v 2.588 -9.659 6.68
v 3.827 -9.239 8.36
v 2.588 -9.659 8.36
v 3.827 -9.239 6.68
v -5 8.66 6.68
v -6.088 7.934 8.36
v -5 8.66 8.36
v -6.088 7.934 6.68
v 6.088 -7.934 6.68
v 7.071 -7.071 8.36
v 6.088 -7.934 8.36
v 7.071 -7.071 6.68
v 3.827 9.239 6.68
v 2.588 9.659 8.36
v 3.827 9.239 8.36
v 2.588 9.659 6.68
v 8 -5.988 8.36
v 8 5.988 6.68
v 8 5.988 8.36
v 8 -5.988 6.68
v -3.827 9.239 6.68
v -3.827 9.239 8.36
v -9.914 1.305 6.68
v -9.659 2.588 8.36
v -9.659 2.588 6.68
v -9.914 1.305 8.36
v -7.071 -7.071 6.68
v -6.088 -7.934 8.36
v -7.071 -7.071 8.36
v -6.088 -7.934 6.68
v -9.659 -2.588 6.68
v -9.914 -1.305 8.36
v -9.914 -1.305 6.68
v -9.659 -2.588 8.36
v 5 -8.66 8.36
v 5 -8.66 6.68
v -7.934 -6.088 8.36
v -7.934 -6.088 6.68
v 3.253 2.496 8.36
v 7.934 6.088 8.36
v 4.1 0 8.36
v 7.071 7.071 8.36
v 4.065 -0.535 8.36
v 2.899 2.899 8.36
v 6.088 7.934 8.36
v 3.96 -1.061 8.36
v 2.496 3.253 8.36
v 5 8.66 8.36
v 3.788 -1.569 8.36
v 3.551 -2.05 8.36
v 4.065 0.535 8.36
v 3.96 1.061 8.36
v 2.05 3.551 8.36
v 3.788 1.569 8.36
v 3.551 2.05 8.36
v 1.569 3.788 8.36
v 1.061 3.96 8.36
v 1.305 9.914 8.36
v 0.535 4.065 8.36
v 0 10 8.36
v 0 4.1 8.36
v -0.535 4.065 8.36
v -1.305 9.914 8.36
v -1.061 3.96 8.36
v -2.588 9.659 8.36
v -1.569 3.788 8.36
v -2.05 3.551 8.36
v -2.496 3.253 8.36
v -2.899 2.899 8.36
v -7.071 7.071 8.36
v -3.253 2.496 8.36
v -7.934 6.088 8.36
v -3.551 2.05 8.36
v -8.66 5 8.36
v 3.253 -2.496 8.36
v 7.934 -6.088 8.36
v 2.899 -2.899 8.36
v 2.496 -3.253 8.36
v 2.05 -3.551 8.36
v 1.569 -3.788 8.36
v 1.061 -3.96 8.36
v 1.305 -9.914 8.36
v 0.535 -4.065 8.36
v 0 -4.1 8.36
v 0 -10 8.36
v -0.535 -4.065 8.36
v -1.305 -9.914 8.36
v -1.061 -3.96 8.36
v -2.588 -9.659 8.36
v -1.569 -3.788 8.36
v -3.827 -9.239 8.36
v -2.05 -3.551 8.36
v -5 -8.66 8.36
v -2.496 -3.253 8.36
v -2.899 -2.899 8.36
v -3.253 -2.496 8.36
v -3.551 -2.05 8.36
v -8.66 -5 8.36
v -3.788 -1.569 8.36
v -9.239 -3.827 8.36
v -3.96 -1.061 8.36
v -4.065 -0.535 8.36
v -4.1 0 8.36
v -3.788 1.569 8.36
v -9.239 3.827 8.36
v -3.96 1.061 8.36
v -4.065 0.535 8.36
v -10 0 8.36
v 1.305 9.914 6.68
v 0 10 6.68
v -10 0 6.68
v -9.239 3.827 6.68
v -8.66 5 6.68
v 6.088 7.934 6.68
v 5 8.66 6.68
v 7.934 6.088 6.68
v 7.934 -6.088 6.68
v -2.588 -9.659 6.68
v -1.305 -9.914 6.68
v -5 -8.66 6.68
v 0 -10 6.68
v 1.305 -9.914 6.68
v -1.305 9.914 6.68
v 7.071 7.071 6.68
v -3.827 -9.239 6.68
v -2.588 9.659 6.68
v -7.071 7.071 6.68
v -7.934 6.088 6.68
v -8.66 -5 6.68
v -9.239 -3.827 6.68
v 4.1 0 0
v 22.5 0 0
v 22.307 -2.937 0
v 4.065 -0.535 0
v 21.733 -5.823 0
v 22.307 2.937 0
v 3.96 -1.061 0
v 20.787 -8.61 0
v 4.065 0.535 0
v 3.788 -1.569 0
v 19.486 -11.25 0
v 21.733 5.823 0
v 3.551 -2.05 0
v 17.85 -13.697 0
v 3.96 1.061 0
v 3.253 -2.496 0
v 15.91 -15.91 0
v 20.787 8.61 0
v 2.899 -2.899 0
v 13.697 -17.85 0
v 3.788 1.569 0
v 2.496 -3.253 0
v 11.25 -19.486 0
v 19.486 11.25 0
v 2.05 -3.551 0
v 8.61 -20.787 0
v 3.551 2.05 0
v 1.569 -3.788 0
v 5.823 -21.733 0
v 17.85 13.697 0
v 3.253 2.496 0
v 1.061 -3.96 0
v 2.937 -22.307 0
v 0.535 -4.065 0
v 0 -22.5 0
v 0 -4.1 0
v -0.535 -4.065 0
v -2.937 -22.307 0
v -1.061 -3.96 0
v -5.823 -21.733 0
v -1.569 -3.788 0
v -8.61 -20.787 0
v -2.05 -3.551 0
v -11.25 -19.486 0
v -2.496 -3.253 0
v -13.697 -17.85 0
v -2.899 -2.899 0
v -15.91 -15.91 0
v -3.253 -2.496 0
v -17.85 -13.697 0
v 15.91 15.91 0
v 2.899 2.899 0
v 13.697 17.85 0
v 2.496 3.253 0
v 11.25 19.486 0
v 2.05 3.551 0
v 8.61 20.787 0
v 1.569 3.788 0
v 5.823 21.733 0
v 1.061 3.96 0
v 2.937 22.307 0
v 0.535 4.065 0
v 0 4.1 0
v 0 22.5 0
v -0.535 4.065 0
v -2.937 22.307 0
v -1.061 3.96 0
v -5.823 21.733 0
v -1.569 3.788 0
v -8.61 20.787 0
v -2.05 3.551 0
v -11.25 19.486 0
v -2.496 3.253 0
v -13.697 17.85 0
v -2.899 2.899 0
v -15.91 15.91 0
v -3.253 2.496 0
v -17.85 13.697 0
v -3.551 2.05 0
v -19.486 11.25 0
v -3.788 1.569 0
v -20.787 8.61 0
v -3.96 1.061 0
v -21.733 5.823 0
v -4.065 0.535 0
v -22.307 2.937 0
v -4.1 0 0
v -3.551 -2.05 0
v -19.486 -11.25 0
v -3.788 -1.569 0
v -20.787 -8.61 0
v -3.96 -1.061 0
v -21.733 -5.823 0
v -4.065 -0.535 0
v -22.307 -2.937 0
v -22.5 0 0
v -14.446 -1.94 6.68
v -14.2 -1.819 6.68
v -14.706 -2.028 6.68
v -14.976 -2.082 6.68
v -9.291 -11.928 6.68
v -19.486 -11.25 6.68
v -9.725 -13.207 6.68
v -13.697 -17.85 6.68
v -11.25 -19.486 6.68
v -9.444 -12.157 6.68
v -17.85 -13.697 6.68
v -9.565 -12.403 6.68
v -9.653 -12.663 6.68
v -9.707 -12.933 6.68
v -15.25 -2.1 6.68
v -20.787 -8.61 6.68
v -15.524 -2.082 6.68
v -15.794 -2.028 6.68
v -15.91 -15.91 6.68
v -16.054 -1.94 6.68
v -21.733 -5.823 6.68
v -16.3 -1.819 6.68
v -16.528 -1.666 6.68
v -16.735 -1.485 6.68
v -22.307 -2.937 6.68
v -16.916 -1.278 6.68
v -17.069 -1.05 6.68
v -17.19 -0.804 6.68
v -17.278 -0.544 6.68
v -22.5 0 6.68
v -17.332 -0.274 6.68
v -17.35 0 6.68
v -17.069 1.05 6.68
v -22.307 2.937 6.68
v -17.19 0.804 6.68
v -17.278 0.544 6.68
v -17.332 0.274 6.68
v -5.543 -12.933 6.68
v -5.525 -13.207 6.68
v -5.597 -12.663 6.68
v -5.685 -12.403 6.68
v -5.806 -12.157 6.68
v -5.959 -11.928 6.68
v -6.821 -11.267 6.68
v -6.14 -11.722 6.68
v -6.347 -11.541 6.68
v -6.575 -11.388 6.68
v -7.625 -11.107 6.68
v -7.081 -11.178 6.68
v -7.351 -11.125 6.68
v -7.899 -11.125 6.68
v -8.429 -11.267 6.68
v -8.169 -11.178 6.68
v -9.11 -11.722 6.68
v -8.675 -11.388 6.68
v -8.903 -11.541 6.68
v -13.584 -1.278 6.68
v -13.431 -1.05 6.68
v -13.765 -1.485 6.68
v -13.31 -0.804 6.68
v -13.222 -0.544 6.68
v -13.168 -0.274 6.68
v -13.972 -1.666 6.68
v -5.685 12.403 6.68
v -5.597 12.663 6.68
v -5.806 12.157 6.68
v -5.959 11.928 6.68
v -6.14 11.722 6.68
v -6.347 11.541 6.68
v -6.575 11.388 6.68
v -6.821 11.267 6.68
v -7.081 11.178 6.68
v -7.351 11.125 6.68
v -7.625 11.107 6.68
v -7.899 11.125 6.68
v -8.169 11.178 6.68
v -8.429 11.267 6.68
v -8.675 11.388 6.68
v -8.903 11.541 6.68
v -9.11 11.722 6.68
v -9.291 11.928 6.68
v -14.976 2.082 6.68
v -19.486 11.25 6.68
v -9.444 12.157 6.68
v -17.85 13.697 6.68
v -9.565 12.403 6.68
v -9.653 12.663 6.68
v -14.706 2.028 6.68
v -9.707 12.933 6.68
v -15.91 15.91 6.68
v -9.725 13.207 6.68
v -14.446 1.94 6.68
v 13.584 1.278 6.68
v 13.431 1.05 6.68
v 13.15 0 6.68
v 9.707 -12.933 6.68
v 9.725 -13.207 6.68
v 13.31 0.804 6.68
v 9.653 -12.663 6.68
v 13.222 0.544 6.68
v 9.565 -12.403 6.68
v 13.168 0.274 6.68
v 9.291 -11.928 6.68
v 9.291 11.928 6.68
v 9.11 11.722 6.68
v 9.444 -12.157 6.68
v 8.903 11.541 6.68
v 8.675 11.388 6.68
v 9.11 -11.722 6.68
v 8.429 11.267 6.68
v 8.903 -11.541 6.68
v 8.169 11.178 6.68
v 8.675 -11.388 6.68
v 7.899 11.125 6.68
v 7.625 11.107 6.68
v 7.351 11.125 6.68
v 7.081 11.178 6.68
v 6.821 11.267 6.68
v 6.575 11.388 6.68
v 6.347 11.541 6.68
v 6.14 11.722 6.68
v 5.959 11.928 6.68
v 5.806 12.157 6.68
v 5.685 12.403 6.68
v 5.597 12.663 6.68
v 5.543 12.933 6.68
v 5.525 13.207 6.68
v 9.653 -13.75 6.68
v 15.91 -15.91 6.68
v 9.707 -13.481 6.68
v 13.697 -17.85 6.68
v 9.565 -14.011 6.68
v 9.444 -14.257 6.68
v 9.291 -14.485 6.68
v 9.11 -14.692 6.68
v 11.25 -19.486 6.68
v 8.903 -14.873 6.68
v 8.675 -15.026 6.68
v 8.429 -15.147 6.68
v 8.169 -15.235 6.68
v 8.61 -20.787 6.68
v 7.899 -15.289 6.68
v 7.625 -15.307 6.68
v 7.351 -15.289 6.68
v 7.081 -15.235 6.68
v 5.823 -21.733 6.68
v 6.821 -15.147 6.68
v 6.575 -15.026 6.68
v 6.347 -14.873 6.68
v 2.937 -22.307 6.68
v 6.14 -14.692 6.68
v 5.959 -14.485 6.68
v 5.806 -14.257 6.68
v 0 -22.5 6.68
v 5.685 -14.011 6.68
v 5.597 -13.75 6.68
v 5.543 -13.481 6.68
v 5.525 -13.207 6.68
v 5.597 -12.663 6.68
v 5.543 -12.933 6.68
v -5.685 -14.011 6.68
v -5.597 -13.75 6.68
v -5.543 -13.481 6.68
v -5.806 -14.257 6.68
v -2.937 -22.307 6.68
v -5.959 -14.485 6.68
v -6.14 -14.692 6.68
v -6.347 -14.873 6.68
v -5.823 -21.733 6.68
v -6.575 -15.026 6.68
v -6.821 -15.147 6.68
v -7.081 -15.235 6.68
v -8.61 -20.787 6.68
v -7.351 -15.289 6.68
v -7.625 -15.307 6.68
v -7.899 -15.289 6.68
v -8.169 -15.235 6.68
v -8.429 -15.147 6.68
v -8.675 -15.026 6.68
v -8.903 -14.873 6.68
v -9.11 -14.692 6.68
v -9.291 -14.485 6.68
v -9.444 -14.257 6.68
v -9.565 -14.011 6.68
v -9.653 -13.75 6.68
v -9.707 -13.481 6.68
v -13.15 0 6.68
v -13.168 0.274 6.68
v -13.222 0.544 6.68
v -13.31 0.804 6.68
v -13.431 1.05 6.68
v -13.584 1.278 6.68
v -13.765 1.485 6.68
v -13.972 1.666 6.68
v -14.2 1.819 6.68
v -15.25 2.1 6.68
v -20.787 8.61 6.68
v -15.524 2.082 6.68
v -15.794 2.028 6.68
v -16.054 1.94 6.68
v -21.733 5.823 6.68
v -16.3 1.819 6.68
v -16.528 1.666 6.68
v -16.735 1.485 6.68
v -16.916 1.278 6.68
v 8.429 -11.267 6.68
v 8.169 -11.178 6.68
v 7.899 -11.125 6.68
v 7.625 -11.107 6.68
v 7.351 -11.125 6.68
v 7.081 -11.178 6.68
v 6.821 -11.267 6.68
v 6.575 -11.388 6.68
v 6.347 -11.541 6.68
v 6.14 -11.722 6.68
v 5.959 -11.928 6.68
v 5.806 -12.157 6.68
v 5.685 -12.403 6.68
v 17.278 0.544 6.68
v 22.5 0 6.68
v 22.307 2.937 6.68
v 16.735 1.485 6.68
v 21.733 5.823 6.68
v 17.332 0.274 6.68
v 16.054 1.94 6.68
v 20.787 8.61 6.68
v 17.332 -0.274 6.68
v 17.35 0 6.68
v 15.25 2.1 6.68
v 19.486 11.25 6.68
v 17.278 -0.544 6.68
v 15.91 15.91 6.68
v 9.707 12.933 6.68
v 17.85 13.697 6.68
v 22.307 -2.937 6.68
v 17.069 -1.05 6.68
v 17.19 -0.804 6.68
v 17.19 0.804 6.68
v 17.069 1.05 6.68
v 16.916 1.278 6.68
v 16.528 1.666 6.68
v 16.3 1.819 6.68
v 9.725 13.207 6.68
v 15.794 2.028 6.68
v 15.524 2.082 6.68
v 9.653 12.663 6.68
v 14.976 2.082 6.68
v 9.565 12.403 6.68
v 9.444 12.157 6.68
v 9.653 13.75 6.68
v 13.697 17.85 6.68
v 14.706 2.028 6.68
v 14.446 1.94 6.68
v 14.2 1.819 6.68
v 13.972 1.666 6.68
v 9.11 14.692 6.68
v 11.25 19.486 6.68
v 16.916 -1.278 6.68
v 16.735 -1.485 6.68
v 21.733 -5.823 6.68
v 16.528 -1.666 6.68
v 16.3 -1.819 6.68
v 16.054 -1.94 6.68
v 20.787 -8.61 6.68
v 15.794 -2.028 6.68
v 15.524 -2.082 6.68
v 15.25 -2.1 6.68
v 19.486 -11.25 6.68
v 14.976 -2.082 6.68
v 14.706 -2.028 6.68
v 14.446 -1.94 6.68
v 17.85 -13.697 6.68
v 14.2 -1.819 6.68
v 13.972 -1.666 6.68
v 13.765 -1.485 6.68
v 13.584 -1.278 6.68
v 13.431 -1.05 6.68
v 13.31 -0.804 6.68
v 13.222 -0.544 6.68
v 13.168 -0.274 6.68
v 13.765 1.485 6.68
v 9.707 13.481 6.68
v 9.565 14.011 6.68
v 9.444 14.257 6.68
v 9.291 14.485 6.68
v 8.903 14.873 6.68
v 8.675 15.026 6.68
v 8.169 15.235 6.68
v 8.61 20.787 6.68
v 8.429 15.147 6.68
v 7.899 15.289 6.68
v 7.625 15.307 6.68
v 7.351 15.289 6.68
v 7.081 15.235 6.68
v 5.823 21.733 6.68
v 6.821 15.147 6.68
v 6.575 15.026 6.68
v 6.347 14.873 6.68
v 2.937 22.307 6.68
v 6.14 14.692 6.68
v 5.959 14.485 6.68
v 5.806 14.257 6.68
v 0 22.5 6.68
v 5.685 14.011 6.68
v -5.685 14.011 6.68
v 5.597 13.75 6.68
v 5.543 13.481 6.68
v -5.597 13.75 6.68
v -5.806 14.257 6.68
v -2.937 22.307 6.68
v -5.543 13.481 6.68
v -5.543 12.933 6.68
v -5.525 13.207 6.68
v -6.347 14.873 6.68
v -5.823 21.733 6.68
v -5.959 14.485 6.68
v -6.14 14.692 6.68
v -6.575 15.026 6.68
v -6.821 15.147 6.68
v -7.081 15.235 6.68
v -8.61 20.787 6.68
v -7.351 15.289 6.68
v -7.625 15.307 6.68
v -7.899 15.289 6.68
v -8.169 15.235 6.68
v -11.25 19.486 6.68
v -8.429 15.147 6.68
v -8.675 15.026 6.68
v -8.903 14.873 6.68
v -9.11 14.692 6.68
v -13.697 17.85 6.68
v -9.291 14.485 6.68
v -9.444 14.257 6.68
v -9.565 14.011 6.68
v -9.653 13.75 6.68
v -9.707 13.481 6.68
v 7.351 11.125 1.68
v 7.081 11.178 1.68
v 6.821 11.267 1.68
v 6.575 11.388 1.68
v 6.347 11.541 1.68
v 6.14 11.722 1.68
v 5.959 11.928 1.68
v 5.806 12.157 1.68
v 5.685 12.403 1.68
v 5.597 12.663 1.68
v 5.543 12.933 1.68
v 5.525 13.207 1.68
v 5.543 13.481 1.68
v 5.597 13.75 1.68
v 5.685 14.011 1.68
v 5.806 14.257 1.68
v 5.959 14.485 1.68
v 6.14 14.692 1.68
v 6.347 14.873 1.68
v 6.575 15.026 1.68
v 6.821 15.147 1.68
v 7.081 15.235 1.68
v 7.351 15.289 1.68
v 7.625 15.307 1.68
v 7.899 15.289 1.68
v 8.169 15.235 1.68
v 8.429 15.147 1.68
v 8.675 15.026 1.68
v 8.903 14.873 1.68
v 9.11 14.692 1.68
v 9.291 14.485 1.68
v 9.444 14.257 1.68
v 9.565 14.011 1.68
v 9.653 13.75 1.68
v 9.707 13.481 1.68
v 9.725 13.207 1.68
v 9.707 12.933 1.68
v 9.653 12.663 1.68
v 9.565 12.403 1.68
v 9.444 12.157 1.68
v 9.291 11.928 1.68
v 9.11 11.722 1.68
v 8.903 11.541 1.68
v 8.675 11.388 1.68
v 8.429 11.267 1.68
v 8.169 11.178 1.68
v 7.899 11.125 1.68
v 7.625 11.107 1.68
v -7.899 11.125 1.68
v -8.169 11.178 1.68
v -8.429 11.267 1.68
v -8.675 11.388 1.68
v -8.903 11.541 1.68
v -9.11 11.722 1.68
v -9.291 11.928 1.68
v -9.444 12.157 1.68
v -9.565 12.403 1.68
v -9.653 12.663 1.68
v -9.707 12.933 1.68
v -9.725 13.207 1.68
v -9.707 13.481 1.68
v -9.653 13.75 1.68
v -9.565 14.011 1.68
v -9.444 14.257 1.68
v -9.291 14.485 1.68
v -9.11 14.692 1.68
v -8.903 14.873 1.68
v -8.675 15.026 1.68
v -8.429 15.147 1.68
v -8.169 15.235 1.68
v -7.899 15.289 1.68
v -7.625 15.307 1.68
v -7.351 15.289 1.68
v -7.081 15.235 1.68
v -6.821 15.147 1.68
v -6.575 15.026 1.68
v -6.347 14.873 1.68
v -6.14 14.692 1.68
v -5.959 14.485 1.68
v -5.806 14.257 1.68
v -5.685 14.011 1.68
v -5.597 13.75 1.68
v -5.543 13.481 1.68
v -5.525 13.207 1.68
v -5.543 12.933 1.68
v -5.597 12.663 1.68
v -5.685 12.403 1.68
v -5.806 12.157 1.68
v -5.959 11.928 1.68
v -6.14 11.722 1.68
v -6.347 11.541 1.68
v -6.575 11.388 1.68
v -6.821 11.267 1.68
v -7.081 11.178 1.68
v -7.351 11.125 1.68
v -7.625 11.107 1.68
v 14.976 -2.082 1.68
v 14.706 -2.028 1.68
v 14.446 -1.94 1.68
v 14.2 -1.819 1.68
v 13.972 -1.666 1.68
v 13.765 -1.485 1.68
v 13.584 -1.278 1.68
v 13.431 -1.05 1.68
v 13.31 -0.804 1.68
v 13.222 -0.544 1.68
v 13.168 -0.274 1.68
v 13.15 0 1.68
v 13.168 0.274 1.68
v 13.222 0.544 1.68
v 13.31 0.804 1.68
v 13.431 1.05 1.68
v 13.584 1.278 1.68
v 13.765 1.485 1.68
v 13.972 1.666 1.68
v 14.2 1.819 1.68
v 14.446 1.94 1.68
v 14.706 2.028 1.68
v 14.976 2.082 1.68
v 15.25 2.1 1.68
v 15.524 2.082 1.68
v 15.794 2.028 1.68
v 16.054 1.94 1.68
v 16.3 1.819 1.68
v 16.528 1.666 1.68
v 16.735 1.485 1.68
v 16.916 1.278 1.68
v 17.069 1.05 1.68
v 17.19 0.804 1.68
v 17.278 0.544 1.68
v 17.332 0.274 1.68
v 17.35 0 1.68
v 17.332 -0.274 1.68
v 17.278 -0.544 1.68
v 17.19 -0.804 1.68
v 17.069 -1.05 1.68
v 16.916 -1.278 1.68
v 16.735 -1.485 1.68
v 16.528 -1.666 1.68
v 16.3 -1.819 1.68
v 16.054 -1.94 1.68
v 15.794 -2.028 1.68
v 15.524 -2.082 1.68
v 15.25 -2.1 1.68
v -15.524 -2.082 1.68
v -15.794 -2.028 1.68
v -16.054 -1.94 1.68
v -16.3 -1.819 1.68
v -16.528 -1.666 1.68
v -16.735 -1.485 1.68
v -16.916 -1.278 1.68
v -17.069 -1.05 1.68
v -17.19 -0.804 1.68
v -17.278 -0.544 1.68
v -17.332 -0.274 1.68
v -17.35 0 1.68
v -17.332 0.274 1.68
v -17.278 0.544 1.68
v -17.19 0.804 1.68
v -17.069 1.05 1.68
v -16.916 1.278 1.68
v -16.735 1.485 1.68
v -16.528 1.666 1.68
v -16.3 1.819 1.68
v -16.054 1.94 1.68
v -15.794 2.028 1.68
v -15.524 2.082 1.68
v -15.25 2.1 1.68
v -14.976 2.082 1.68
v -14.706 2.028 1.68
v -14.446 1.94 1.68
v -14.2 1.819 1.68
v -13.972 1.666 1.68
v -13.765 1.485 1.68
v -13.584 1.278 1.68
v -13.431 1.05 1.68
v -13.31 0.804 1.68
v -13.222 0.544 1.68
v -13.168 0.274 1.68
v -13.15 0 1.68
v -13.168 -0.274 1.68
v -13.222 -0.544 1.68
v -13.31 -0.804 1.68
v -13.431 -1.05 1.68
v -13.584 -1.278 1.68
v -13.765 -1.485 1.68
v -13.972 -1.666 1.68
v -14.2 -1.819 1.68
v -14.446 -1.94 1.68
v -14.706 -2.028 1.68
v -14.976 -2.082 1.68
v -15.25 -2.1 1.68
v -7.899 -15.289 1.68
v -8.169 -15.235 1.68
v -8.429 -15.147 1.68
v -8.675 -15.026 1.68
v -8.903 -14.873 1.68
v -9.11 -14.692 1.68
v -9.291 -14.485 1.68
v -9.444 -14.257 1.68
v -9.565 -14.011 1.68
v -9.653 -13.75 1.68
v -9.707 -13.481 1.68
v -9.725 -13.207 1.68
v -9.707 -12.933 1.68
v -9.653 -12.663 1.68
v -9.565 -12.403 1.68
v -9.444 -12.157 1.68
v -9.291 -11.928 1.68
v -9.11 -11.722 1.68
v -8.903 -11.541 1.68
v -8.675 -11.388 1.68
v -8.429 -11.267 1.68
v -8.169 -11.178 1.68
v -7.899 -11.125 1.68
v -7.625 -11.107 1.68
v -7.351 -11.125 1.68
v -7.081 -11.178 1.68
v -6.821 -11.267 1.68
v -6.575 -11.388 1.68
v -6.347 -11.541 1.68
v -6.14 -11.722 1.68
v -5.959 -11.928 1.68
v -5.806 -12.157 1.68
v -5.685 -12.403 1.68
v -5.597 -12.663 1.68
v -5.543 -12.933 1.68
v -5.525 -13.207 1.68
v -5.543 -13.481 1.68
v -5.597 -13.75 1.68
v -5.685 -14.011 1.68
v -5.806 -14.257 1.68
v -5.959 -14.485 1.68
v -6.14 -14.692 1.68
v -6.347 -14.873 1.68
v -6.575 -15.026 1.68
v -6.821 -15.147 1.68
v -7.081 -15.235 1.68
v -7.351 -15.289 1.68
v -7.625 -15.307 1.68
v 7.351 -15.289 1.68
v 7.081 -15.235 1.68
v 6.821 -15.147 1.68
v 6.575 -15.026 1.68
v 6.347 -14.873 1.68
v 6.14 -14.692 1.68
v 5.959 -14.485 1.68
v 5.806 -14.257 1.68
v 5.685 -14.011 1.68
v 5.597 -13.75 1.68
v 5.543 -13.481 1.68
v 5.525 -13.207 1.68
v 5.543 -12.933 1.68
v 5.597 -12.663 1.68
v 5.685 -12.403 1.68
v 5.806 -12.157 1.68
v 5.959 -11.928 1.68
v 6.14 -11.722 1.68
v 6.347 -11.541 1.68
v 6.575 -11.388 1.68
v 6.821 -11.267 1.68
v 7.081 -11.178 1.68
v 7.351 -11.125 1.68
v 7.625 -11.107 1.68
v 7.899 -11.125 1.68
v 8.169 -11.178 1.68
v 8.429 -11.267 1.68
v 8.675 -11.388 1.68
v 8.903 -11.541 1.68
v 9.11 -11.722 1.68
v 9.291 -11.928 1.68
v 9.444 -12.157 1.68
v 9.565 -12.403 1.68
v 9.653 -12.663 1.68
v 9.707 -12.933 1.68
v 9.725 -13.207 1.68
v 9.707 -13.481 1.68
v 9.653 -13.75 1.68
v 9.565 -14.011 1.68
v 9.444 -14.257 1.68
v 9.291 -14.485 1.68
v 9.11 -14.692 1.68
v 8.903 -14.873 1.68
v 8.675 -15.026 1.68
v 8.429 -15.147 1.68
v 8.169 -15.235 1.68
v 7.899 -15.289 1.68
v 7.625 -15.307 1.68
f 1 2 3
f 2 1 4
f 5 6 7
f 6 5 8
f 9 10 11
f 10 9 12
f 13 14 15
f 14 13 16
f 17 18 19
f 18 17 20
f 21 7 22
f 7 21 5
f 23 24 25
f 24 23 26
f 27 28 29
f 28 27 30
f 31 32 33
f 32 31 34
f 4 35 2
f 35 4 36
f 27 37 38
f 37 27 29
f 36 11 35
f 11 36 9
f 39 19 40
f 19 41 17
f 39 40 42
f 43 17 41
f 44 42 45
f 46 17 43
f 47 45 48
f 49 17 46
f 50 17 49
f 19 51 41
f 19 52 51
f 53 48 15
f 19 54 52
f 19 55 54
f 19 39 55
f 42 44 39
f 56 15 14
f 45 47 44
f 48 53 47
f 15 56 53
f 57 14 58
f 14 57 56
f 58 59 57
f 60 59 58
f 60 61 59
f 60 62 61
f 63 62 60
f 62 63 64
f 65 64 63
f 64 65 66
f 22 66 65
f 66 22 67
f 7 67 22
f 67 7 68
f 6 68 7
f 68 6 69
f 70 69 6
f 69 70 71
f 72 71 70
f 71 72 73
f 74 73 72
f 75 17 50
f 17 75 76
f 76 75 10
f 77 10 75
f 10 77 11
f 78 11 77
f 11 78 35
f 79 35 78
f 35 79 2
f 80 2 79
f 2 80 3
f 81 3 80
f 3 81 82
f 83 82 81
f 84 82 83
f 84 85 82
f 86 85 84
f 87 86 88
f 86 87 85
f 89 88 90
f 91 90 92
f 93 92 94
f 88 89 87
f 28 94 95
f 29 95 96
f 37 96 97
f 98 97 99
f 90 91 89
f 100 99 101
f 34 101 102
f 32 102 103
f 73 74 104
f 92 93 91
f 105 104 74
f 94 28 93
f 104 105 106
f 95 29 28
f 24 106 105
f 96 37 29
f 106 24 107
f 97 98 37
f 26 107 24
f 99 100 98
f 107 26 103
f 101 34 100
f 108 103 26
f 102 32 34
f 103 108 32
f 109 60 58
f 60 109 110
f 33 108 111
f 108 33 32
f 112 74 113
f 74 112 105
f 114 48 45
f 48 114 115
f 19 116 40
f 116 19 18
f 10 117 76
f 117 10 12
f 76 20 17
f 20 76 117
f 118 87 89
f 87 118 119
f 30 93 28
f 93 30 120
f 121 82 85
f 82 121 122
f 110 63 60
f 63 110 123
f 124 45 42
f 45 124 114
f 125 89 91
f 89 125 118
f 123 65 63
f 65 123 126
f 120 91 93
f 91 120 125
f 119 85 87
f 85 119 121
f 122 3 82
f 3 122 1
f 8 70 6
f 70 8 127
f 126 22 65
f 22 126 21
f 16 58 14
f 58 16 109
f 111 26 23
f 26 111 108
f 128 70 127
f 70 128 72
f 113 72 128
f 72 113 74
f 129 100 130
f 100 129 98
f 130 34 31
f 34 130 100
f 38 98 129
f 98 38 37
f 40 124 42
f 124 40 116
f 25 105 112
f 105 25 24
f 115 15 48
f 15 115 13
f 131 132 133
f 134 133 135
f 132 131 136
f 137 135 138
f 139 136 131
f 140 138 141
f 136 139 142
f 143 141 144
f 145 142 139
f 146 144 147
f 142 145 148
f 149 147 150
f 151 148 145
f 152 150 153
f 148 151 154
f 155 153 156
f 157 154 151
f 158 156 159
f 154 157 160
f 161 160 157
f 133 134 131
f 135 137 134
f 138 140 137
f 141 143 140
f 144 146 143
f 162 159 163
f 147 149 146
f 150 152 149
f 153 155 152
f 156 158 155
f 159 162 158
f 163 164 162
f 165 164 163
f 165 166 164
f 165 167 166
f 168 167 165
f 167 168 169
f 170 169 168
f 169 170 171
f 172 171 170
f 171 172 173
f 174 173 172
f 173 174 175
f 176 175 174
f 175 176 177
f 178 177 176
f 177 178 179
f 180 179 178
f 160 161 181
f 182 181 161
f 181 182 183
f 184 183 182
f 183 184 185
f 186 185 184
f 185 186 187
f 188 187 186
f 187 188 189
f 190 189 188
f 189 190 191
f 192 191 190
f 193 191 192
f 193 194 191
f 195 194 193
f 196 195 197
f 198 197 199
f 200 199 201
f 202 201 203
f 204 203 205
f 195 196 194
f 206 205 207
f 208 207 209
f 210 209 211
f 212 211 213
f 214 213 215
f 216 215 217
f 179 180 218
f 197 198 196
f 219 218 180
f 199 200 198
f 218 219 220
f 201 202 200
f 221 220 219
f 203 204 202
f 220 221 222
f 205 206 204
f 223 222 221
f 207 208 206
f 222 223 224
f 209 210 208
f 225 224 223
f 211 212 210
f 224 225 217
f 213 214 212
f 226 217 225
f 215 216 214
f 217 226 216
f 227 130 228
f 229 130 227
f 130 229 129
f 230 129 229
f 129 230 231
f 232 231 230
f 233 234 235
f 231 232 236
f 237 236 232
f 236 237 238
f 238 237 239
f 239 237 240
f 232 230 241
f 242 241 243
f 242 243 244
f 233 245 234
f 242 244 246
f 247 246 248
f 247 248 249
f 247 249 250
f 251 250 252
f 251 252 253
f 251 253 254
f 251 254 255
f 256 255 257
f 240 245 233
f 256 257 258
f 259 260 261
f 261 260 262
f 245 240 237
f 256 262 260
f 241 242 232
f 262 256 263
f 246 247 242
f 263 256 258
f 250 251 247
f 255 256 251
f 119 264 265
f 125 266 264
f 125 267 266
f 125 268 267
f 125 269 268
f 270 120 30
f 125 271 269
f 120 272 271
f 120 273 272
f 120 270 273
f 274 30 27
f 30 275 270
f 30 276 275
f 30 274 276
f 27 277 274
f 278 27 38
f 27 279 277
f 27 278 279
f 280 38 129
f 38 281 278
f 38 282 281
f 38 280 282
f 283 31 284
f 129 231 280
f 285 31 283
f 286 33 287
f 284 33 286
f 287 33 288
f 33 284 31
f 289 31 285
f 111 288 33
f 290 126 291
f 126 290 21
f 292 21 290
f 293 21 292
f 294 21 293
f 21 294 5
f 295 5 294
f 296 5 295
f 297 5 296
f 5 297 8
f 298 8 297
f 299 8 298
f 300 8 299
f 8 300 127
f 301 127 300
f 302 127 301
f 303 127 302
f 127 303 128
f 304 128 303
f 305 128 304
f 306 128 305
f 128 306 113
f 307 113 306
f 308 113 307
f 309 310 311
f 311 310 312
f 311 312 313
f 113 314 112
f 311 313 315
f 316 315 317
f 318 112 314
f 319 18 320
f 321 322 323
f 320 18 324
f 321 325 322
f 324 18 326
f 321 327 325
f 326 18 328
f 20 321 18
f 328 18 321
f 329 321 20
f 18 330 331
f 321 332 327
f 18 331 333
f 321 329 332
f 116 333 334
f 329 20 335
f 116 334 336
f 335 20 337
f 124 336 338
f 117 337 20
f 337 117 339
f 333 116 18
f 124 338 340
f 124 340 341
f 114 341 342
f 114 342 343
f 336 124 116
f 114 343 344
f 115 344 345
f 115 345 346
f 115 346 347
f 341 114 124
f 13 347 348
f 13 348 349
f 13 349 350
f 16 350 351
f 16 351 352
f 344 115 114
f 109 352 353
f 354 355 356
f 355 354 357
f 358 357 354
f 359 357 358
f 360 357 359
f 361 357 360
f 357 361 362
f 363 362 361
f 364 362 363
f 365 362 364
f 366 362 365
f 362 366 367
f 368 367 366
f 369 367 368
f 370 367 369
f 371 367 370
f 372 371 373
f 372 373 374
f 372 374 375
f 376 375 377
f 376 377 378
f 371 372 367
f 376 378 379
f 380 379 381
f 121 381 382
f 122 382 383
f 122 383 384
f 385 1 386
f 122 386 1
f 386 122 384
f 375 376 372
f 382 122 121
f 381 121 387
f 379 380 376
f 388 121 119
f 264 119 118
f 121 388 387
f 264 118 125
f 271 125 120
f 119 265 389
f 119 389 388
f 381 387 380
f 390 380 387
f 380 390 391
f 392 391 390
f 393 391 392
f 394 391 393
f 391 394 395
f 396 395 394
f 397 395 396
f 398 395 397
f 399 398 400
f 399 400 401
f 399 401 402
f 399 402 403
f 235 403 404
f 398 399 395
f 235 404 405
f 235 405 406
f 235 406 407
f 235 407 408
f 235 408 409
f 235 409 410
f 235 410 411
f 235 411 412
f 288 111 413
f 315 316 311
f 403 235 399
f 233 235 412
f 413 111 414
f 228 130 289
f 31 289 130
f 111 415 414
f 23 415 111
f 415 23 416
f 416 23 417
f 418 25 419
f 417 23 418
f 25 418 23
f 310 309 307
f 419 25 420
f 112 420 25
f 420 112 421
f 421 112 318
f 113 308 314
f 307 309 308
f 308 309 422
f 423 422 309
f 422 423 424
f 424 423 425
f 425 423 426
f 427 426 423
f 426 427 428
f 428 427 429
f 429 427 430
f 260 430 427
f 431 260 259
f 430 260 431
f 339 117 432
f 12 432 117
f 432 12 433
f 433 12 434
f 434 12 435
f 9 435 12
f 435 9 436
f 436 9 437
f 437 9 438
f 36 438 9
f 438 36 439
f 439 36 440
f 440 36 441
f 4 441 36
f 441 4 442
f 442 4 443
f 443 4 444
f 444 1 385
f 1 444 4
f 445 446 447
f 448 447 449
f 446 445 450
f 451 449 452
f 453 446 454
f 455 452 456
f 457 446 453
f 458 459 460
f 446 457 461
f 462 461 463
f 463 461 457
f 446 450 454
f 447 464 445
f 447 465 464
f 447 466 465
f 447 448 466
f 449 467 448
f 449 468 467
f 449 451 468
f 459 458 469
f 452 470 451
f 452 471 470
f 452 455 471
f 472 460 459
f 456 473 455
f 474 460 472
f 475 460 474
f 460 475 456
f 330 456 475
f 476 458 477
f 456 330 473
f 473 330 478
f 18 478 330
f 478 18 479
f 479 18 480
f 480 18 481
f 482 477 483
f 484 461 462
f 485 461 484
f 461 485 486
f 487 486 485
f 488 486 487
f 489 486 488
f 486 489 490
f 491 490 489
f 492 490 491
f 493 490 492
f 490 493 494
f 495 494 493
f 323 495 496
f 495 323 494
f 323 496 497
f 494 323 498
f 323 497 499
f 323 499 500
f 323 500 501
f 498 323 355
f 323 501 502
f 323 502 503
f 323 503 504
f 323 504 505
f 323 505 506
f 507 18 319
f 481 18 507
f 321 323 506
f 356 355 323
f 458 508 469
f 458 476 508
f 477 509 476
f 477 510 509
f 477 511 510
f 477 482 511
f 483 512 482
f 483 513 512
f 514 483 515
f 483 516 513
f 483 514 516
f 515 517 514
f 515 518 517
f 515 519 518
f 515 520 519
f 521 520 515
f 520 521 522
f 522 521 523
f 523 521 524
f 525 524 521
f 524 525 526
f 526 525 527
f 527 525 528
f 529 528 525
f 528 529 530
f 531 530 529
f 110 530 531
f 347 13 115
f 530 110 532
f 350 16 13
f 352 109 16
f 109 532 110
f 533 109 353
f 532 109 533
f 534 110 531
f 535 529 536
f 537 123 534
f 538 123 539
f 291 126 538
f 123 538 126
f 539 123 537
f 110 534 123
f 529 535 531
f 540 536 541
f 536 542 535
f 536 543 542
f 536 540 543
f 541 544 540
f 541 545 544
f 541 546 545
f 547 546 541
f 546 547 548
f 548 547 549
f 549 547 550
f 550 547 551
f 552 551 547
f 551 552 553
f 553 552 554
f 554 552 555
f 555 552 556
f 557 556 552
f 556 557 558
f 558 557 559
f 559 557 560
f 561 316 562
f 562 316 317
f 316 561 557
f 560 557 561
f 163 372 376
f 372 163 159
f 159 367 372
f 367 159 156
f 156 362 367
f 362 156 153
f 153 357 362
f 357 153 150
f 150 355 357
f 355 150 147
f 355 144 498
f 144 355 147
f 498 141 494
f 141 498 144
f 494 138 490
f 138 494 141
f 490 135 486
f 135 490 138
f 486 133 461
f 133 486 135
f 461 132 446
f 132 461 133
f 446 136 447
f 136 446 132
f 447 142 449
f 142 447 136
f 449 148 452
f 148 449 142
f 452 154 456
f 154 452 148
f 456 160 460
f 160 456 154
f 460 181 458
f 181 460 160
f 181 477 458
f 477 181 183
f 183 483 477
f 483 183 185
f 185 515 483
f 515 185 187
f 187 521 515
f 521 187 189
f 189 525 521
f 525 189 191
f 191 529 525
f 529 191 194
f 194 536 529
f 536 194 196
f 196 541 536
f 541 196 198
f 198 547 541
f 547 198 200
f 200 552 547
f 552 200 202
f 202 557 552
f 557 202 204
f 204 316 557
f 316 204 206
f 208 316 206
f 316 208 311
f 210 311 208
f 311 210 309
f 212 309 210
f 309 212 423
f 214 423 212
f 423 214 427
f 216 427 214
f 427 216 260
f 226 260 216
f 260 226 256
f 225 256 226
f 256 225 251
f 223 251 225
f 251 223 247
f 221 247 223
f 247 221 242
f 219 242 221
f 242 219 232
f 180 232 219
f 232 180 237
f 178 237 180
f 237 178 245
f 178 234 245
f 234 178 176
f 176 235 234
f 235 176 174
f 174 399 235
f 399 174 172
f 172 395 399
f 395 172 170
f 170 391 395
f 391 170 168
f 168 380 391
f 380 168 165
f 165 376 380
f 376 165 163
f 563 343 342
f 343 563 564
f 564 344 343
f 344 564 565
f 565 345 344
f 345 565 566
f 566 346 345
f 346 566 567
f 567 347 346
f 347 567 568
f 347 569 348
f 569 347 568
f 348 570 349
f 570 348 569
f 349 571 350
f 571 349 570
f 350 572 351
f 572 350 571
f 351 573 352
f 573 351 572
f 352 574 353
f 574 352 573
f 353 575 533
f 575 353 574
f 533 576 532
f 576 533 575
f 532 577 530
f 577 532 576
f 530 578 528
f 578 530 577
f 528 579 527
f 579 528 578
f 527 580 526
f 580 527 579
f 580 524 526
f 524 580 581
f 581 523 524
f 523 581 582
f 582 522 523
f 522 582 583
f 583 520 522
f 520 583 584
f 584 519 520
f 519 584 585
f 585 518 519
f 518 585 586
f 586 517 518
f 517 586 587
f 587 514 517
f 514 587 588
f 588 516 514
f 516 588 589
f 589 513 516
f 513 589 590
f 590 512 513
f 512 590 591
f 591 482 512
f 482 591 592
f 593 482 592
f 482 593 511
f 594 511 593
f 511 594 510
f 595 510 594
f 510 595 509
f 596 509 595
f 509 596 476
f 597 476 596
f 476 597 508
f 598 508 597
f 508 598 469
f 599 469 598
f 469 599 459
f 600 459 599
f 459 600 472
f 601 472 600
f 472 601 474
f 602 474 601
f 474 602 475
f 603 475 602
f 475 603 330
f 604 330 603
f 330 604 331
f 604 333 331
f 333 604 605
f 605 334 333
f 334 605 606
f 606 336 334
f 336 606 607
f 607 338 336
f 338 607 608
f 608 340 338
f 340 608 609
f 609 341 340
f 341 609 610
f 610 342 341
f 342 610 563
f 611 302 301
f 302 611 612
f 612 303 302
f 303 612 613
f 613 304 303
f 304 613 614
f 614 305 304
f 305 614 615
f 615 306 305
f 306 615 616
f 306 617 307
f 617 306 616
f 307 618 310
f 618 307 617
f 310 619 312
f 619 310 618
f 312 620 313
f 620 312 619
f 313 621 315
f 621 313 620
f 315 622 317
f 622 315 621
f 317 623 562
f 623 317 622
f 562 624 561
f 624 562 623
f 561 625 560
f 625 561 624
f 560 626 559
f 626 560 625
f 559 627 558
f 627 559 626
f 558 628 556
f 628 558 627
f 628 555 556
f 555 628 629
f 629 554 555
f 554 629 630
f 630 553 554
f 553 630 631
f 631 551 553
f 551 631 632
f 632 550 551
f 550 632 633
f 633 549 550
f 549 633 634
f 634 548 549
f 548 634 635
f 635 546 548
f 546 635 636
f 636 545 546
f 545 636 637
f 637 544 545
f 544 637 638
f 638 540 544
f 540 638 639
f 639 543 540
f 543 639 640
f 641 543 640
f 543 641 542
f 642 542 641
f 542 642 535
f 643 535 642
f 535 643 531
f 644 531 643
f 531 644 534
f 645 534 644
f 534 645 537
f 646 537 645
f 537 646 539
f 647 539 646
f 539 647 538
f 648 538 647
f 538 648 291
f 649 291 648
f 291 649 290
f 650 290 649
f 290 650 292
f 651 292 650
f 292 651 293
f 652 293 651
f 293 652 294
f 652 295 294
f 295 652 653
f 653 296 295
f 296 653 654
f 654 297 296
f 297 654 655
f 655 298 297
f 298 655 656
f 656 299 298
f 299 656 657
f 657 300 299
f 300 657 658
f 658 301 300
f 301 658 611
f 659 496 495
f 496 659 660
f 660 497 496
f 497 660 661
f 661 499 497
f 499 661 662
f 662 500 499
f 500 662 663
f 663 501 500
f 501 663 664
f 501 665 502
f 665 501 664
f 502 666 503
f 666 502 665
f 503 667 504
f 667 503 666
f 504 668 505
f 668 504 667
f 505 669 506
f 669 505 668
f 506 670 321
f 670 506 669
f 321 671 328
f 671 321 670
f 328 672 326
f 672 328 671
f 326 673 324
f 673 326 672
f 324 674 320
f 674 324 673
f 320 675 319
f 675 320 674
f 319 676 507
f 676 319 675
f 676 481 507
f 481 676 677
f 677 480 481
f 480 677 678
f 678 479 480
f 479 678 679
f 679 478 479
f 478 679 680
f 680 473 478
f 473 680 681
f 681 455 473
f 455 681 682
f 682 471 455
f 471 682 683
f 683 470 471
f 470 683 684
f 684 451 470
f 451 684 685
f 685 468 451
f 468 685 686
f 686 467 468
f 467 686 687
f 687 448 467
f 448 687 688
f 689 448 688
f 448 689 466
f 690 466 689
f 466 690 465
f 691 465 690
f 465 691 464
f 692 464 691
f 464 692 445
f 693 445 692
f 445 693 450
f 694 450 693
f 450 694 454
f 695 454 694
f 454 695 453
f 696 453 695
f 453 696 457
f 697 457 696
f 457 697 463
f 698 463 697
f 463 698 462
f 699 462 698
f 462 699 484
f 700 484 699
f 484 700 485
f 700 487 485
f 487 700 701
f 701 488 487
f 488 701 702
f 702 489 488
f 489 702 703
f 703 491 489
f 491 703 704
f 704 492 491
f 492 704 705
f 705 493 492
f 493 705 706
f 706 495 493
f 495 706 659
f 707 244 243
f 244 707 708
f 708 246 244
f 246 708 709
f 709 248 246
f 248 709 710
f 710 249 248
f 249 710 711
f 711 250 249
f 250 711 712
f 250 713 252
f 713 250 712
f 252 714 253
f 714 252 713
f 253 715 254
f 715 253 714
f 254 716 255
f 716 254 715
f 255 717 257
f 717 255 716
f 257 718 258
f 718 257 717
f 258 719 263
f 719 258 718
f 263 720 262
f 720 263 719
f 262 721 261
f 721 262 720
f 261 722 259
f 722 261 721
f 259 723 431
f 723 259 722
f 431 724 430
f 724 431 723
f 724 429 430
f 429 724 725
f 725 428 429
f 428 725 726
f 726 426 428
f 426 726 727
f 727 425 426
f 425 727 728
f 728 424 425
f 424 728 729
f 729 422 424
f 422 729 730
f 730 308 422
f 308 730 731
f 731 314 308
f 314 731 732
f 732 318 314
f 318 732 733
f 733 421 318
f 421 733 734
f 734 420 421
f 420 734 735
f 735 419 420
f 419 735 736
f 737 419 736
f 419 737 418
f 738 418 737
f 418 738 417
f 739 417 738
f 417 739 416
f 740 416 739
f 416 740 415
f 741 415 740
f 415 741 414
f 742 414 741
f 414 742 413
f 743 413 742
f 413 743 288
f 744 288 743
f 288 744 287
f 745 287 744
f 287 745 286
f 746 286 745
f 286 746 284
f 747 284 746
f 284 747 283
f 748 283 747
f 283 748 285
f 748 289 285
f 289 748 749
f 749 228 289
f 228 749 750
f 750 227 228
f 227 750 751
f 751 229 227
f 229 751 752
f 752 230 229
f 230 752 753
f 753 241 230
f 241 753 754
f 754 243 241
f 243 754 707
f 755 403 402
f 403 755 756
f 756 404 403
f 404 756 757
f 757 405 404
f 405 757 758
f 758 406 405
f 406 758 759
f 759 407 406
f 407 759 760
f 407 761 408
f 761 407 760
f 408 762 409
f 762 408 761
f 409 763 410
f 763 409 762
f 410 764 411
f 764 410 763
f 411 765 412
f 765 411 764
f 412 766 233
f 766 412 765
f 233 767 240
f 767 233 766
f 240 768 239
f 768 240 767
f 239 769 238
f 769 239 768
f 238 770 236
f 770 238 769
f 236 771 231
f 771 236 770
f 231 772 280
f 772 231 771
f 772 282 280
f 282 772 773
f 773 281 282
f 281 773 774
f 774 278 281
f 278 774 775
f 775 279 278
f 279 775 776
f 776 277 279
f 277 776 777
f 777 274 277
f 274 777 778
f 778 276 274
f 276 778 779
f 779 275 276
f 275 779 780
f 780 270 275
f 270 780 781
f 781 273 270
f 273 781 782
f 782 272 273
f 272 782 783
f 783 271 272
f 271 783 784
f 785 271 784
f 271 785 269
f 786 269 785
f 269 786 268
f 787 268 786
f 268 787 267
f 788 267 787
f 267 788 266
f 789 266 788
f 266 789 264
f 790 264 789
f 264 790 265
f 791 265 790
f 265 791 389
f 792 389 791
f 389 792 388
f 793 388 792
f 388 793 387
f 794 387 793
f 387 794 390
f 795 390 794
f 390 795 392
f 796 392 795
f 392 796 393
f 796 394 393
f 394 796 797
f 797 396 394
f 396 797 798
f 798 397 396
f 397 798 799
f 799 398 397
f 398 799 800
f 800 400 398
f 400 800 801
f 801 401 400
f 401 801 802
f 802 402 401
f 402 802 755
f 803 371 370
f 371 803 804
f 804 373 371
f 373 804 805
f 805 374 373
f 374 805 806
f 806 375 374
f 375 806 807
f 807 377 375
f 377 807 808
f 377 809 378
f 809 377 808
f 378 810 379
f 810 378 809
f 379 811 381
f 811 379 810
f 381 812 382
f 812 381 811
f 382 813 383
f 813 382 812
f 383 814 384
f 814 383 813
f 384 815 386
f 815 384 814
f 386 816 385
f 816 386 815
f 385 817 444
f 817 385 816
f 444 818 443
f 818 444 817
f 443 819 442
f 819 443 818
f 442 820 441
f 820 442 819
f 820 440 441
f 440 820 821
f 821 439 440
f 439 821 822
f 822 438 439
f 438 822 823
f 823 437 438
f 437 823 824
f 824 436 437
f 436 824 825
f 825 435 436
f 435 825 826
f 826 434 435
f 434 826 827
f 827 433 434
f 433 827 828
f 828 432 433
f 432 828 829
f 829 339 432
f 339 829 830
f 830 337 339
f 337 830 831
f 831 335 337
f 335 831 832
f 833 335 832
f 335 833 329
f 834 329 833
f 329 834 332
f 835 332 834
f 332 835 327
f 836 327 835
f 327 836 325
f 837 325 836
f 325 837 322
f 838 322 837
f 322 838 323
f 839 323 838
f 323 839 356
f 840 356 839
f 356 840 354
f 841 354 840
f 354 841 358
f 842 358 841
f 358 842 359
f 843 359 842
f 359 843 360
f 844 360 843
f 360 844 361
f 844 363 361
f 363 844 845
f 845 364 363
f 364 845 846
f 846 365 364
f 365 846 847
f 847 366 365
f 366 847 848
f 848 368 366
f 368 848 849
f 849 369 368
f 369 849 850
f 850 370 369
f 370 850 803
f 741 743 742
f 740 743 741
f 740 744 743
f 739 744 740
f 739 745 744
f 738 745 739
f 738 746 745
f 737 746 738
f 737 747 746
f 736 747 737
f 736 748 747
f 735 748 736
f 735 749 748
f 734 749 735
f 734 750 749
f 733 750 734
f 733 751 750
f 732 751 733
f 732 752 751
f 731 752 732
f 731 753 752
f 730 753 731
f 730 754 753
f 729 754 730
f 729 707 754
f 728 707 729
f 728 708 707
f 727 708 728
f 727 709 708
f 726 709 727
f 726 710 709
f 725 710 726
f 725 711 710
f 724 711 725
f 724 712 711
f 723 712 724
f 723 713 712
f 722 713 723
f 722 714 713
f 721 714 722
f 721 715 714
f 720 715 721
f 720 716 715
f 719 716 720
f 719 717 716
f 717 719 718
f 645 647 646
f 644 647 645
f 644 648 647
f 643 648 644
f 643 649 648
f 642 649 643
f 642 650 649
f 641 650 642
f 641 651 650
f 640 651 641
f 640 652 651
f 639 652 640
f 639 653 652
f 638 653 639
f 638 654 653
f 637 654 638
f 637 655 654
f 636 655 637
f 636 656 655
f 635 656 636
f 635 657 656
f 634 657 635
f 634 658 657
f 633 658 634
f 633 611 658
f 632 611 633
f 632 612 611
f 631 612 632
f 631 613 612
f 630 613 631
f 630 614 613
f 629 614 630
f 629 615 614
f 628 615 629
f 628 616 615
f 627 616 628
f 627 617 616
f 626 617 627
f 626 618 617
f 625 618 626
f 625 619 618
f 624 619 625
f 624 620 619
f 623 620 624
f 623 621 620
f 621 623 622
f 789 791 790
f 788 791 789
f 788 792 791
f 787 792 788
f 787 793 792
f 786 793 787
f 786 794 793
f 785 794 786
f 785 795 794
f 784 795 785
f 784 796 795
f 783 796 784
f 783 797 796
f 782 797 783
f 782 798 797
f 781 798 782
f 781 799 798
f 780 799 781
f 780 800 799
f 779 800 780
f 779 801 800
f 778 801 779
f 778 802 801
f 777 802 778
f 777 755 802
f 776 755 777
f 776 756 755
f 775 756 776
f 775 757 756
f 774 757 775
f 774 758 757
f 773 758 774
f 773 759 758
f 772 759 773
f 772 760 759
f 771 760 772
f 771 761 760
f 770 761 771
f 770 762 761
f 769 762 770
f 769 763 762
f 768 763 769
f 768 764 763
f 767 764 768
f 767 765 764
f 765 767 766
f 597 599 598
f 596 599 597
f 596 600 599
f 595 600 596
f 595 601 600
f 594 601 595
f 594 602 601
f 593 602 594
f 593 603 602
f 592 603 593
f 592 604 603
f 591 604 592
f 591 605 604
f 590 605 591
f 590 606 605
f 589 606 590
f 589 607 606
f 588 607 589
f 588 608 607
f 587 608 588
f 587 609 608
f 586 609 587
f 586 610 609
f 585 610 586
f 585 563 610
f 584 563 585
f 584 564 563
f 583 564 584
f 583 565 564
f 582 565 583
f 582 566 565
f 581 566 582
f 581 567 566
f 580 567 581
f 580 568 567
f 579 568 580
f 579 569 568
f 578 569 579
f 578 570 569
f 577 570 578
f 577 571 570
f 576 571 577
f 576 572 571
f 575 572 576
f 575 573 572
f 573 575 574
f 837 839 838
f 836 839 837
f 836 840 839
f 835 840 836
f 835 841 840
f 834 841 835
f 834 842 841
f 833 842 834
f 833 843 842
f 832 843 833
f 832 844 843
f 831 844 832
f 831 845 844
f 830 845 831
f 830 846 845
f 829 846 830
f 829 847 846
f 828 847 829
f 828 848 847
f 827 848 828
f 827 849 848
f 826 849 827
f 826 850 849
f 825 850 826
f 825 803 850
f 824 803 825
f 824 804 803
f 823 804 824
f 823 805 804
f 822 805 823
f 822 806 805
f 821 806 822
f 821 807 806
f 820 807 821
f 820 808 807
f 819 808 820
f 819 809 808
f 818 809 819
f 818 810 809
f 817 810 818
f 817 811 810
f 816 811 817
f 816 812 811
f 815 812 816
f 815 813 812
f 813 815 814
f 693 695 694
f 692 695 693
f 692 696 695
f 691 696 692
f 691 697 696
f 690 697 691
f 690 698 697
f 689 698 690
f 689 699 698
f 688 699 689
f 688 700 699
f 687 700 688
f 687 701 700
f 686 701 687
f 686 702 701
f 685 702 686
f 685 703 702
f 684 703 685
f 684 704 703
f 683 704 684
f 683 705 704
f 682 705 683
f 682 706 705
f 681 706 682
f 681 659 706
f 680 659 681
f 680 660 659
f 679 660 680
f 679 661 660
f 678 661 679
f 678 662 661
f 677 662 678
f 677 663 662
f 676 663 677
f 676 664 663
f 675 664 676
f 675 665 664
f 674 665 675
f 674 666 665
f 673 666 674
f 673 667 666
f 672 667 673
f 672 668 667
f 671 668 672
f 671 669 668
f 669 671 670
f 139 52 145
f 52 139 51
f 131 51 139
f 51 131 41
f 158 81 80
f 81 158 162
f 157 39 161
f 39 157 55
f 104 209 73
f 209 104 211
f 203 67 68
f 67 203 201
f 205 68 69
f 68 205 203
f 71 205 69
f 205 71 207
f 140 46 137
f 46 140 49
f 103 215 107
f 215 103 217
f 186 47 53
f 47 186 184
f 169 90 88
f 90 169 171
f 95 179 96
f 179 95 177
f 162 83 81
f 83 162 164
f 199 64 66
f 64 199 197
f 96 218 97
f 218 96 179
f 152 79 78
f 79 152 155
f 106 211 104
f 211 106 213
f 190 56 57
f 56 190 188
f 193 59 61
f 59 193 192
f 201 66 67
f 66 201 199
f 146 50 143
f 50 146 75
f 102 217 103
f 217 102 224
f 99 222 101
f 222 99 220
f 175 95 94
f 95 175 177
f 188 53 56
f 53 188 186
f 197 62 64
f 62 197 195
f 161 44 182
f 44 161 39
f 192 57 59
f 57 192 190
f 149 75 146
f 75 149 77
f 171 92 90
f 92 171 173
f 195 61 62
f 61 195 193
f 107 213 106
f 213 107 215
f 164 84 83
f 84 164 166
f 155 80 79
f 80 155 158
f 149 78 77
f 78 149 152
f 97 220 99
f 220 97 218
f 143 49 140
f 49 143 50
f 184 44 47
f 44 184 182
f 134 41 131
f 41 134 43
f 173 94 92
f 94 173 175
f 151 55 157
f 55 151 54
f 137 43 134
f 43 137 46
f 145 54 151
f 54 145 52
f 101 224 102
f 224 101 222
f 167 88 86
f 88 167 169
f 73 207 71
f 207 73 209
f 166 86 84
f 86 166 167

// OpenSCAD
// file: ../config.scad
// SCARA 로봇 공통 사양(specification) — 모든 부품 파일에서 include해 사용한다.

$fn = 48;

// ── 공차(tolerance) ──
print_clearance = 0.2;   // FDM 출력 끼워맞춤(fit) 여유 — 압입(press-fit) 자리 제외
eps             = 1/128; // 미세 겹침(epsilon) — 접하는 솔리드를 살짝 겹쳐 동일면(coincident face) z-파이팅 방지

// ── FDM 출력 사양(print specification) ──
fdm_layer_h       = 0.28;   // 레이어 높이(layer height) — 슬라이서(slicer) 설정값과 일치시킨다.
fdm_shoulder_layers = 6;   // 숄더(shoulder) 최소 레이어 수 — FDM 최소 구조 벽(0.4mm 노즐 3겹 ~1.2mm) 기준 하한값.

// ── 레이아웃(layout) ──
// layout_margin — 플레이트 위 부품 배치 공통 여백(margin). 부품 외곽선에서
// 사방으로 주는 값 → 부품끼리는 2*margin 이격, 외곽 가장자리도 margin 확보.
layout_margin = 4;

// ── 시트 형상(seat geometry) ──
// seat_shoulder_t — fdm_layer_h · fdm_shoulder_layers 파생. 슬라이서 설정 변경 시 자동 연동.
seat_shoulder_t = fdm_layer_h * fdm_shoulder_layers;
// main file
/*
 * joint_hub.scad - STANDARD_JOINT_HUB 제작 부품(printed part)
 *
 * SCARA_KINEMATICS.md의 표준 조인트 체결을 따른다. J2(어깨)·J3(팔꿈치)·
 * J4(손목) 회전 관절이 공유하는 표준 조인트 허브 — 회전축을 중심으로 인접
 * 링크를 정렬하고, M3 heat-set 인서트(insert) 체결로 토크를 전달한다.
 *
 * 특징(feature): 원형 플랜지(circular flange), 직선 키 파일럿 보스(keyed pilot
 * boss), 대칭 M3 인서트 패턴, 축 보어(axis bore). 외곽은 360° 회전 여유를 위해
 * 원형으로 유지한다. 베어링 내륜 이격(standoff)은 별도 스페이서(spacer)가
 * 담당한다.
 *
 * 인터페이스는 단일 출처(single source of truth)다. 마운트가 직접 읽는 값만
 * 접근자 함수(joint_pilot_d·joint_pilot_h)로 노출하고, 모듈 내부에서만 쓰는
 * 치수는 변수로 둔다(use가 모듈을 정의 스코프에서 해석하므로 cross-file 안전).
 * parts/joint_mount.scad는 joint_hub를 use해 함수·공유 모듈(joint_disk·
 * keyed_pilot)을 읽고, 치수를 중복 정의하지 않는다.
 *
 * 좌표계: 회전축(axis) = Z, 플랜지 = z=0..flange_t, 파일럿 보스는 +z(마운트 쪽).
 */

include <../config.scad>

/* --- 인터페이스 접근자(accessor) — joint_mount.scad가 use로 직접 호출 --- */
function joint_pilot_d() = 20;			/* keyed pilot boss 외경 — 방향·중심 기준 */
function joint_pilot_h() = seat_shoulder_t;	/* pilot boss 돌출 높이 */

/* --- 형상 치수 — joint_hub 모듈 내부에서만 쓰여 변수로 둔다. use는 모듈을
 * 그 정의 스코프에서 해석하므로 cross-file(마운트)에서도 안전하다. --- */
joint_axis_bore_d = 8 + print_clearance;	/* M6 숄더 볼트 관통 보어 */
joint_pilot_key_t = 2;				/* 방향 키(key) 평면 절삭량 */
joint_bolt_n      = 6;				/* 둘레 체결 볼트 홀 개수(대칭 패턴) */
joint_bolt_head_d = 6.5;			/* 둘레 M3 캡 스크류 머리 + 여유 — 디스크 사이징 */
joint_head_d      = 13;				/* 중앙 M6 숄더 볼트 머리 — assert용 */

/*
 * 디스크 외경(disk diameter) — 중앙 파일럿(pilot_d)에 둘레 여백 하나를 두고,
 * 그 바깥으로 둘레 볼트 머리와 외곽 여백을 지름 양쪽으로((bolt_head + margin)
 * × 2) 더한다. 파일럿·볼트·외곽이 서로 layout_margin으로 이격된다.
 */
joint_disk_d = joint_pilot_d() + layout_margin
	+ (joint_bolt_head_d + layout_margin) * 2;

/* 검증 — 중앙 M6 머리가 파일럿 소켓(마운트 전 두께 관통)을 통과해야 한다. */
assert(joint_pilot_d() >= joint_head_d,
       "joint_pilot_d must be >= joint_head_d (M6 head must clear pilot socket)");

/* 체결 볼트 분포원(bolt circle) — 디스크 가장자리에서 볼트 머리 + margin 안쪽. */
joint_bolt_pitch_circle_d = joint_disk_d - joint_bolt_head_d - 2 * layout_margin;

/* --- 허브 전용 치수 --- */
insert_hole_d	= 4.2;	/* M3 heat-set brass insert 블라인드 홀 지름 */
insert_hole_h	= 5;	/* 인서트 홀 깊이 */
flange_d	= joint_disk_d;	/* 원형 플랜지 외경 — 머리 레이아웃 파생 */
flange_t	= insert_hole_h + seat_shoulder_t;	/* 인서트 블라인드 홀 + FDM 최소 바닥 */

/*
 * 방향 키(key)가 붙은 파일럿 형상 — 외경 d, 높이 h로 바로 압출한다. 한쪽
 * 평면 절삭으로 각도를 강제하며, 허브 보스(양형)·마운트 소켓(음형)이 공유해
 * 항상 일치한다.
 */
module keyed_pilot(d, h)
	linear_extrude(h)
		difference() {
			circle(d = d);
			translate([d / 2 - joint_pilot_key_t, -d])
				square([d, 2 * d]);
		}

/*
 * 허브·마운트 공유 디스크 — 디스크 외경 + 중앙 축 보어 + 볼트 피치원 홀
 * (bolt_hole_d)을 갖는 높이 h 솔리드. 두 부품이 같은 외경·축 보어·볼트원을
 * 쓴다.
 */
module joint_disk(bolt_hole_d, h)
	linear_extrude(h)
		difference() {
			circle(d = joint_disk_d);
			circle(d = joint_axis_bore_d);
			for (i = [0 : joint_bolt_n - 1])
				rotate([0, 0, i * 360 / joint_bolt_n])
					translate([joint_bolt_pitch_circle_d / 2, 0])
						circle(d = bolt_hole_d);
		}

module joint_hub()
{
	pilot_h	= joint_pilot_h();

	difference() {
		union() {
			/* keyed pilot boss — 마운트 소켓에 끼워 동심·방향 강제 */
			translate([0, 0, flange_t - eps])
				keyed_pilot(joint_pilot_d(), pilot_h + eps);

			/* 플랜지 — 공유 디스크(축 보어 + 인서트 홀 관통) */
			joint_disk(insert_hole_d, flange_t);

			/* blind 플러그 — 같은 디스크를 볼트 홀 없이(bolt_hole_d = 0)
			 * 두께에서 인서트 깊이를 뺀 만큼 깔아 인서트 홀 바닥을 메운다
			 * → 인서트 홀이 blind가 된다(축 보어는 디스크가 관통 유지). */
			joint_disk(0, flange_t - insert_hole_h);
		}

		/* 축 보어 — 플랜지·파일럿 전체 관통(M6 숄더 볼트) */
		translate([0, 0, -eps])
			cylinder(d = joint_axis_bore_d,
				 h = flange_t + pilot_h + 2 * eps);
	}
}

joint_hub();
